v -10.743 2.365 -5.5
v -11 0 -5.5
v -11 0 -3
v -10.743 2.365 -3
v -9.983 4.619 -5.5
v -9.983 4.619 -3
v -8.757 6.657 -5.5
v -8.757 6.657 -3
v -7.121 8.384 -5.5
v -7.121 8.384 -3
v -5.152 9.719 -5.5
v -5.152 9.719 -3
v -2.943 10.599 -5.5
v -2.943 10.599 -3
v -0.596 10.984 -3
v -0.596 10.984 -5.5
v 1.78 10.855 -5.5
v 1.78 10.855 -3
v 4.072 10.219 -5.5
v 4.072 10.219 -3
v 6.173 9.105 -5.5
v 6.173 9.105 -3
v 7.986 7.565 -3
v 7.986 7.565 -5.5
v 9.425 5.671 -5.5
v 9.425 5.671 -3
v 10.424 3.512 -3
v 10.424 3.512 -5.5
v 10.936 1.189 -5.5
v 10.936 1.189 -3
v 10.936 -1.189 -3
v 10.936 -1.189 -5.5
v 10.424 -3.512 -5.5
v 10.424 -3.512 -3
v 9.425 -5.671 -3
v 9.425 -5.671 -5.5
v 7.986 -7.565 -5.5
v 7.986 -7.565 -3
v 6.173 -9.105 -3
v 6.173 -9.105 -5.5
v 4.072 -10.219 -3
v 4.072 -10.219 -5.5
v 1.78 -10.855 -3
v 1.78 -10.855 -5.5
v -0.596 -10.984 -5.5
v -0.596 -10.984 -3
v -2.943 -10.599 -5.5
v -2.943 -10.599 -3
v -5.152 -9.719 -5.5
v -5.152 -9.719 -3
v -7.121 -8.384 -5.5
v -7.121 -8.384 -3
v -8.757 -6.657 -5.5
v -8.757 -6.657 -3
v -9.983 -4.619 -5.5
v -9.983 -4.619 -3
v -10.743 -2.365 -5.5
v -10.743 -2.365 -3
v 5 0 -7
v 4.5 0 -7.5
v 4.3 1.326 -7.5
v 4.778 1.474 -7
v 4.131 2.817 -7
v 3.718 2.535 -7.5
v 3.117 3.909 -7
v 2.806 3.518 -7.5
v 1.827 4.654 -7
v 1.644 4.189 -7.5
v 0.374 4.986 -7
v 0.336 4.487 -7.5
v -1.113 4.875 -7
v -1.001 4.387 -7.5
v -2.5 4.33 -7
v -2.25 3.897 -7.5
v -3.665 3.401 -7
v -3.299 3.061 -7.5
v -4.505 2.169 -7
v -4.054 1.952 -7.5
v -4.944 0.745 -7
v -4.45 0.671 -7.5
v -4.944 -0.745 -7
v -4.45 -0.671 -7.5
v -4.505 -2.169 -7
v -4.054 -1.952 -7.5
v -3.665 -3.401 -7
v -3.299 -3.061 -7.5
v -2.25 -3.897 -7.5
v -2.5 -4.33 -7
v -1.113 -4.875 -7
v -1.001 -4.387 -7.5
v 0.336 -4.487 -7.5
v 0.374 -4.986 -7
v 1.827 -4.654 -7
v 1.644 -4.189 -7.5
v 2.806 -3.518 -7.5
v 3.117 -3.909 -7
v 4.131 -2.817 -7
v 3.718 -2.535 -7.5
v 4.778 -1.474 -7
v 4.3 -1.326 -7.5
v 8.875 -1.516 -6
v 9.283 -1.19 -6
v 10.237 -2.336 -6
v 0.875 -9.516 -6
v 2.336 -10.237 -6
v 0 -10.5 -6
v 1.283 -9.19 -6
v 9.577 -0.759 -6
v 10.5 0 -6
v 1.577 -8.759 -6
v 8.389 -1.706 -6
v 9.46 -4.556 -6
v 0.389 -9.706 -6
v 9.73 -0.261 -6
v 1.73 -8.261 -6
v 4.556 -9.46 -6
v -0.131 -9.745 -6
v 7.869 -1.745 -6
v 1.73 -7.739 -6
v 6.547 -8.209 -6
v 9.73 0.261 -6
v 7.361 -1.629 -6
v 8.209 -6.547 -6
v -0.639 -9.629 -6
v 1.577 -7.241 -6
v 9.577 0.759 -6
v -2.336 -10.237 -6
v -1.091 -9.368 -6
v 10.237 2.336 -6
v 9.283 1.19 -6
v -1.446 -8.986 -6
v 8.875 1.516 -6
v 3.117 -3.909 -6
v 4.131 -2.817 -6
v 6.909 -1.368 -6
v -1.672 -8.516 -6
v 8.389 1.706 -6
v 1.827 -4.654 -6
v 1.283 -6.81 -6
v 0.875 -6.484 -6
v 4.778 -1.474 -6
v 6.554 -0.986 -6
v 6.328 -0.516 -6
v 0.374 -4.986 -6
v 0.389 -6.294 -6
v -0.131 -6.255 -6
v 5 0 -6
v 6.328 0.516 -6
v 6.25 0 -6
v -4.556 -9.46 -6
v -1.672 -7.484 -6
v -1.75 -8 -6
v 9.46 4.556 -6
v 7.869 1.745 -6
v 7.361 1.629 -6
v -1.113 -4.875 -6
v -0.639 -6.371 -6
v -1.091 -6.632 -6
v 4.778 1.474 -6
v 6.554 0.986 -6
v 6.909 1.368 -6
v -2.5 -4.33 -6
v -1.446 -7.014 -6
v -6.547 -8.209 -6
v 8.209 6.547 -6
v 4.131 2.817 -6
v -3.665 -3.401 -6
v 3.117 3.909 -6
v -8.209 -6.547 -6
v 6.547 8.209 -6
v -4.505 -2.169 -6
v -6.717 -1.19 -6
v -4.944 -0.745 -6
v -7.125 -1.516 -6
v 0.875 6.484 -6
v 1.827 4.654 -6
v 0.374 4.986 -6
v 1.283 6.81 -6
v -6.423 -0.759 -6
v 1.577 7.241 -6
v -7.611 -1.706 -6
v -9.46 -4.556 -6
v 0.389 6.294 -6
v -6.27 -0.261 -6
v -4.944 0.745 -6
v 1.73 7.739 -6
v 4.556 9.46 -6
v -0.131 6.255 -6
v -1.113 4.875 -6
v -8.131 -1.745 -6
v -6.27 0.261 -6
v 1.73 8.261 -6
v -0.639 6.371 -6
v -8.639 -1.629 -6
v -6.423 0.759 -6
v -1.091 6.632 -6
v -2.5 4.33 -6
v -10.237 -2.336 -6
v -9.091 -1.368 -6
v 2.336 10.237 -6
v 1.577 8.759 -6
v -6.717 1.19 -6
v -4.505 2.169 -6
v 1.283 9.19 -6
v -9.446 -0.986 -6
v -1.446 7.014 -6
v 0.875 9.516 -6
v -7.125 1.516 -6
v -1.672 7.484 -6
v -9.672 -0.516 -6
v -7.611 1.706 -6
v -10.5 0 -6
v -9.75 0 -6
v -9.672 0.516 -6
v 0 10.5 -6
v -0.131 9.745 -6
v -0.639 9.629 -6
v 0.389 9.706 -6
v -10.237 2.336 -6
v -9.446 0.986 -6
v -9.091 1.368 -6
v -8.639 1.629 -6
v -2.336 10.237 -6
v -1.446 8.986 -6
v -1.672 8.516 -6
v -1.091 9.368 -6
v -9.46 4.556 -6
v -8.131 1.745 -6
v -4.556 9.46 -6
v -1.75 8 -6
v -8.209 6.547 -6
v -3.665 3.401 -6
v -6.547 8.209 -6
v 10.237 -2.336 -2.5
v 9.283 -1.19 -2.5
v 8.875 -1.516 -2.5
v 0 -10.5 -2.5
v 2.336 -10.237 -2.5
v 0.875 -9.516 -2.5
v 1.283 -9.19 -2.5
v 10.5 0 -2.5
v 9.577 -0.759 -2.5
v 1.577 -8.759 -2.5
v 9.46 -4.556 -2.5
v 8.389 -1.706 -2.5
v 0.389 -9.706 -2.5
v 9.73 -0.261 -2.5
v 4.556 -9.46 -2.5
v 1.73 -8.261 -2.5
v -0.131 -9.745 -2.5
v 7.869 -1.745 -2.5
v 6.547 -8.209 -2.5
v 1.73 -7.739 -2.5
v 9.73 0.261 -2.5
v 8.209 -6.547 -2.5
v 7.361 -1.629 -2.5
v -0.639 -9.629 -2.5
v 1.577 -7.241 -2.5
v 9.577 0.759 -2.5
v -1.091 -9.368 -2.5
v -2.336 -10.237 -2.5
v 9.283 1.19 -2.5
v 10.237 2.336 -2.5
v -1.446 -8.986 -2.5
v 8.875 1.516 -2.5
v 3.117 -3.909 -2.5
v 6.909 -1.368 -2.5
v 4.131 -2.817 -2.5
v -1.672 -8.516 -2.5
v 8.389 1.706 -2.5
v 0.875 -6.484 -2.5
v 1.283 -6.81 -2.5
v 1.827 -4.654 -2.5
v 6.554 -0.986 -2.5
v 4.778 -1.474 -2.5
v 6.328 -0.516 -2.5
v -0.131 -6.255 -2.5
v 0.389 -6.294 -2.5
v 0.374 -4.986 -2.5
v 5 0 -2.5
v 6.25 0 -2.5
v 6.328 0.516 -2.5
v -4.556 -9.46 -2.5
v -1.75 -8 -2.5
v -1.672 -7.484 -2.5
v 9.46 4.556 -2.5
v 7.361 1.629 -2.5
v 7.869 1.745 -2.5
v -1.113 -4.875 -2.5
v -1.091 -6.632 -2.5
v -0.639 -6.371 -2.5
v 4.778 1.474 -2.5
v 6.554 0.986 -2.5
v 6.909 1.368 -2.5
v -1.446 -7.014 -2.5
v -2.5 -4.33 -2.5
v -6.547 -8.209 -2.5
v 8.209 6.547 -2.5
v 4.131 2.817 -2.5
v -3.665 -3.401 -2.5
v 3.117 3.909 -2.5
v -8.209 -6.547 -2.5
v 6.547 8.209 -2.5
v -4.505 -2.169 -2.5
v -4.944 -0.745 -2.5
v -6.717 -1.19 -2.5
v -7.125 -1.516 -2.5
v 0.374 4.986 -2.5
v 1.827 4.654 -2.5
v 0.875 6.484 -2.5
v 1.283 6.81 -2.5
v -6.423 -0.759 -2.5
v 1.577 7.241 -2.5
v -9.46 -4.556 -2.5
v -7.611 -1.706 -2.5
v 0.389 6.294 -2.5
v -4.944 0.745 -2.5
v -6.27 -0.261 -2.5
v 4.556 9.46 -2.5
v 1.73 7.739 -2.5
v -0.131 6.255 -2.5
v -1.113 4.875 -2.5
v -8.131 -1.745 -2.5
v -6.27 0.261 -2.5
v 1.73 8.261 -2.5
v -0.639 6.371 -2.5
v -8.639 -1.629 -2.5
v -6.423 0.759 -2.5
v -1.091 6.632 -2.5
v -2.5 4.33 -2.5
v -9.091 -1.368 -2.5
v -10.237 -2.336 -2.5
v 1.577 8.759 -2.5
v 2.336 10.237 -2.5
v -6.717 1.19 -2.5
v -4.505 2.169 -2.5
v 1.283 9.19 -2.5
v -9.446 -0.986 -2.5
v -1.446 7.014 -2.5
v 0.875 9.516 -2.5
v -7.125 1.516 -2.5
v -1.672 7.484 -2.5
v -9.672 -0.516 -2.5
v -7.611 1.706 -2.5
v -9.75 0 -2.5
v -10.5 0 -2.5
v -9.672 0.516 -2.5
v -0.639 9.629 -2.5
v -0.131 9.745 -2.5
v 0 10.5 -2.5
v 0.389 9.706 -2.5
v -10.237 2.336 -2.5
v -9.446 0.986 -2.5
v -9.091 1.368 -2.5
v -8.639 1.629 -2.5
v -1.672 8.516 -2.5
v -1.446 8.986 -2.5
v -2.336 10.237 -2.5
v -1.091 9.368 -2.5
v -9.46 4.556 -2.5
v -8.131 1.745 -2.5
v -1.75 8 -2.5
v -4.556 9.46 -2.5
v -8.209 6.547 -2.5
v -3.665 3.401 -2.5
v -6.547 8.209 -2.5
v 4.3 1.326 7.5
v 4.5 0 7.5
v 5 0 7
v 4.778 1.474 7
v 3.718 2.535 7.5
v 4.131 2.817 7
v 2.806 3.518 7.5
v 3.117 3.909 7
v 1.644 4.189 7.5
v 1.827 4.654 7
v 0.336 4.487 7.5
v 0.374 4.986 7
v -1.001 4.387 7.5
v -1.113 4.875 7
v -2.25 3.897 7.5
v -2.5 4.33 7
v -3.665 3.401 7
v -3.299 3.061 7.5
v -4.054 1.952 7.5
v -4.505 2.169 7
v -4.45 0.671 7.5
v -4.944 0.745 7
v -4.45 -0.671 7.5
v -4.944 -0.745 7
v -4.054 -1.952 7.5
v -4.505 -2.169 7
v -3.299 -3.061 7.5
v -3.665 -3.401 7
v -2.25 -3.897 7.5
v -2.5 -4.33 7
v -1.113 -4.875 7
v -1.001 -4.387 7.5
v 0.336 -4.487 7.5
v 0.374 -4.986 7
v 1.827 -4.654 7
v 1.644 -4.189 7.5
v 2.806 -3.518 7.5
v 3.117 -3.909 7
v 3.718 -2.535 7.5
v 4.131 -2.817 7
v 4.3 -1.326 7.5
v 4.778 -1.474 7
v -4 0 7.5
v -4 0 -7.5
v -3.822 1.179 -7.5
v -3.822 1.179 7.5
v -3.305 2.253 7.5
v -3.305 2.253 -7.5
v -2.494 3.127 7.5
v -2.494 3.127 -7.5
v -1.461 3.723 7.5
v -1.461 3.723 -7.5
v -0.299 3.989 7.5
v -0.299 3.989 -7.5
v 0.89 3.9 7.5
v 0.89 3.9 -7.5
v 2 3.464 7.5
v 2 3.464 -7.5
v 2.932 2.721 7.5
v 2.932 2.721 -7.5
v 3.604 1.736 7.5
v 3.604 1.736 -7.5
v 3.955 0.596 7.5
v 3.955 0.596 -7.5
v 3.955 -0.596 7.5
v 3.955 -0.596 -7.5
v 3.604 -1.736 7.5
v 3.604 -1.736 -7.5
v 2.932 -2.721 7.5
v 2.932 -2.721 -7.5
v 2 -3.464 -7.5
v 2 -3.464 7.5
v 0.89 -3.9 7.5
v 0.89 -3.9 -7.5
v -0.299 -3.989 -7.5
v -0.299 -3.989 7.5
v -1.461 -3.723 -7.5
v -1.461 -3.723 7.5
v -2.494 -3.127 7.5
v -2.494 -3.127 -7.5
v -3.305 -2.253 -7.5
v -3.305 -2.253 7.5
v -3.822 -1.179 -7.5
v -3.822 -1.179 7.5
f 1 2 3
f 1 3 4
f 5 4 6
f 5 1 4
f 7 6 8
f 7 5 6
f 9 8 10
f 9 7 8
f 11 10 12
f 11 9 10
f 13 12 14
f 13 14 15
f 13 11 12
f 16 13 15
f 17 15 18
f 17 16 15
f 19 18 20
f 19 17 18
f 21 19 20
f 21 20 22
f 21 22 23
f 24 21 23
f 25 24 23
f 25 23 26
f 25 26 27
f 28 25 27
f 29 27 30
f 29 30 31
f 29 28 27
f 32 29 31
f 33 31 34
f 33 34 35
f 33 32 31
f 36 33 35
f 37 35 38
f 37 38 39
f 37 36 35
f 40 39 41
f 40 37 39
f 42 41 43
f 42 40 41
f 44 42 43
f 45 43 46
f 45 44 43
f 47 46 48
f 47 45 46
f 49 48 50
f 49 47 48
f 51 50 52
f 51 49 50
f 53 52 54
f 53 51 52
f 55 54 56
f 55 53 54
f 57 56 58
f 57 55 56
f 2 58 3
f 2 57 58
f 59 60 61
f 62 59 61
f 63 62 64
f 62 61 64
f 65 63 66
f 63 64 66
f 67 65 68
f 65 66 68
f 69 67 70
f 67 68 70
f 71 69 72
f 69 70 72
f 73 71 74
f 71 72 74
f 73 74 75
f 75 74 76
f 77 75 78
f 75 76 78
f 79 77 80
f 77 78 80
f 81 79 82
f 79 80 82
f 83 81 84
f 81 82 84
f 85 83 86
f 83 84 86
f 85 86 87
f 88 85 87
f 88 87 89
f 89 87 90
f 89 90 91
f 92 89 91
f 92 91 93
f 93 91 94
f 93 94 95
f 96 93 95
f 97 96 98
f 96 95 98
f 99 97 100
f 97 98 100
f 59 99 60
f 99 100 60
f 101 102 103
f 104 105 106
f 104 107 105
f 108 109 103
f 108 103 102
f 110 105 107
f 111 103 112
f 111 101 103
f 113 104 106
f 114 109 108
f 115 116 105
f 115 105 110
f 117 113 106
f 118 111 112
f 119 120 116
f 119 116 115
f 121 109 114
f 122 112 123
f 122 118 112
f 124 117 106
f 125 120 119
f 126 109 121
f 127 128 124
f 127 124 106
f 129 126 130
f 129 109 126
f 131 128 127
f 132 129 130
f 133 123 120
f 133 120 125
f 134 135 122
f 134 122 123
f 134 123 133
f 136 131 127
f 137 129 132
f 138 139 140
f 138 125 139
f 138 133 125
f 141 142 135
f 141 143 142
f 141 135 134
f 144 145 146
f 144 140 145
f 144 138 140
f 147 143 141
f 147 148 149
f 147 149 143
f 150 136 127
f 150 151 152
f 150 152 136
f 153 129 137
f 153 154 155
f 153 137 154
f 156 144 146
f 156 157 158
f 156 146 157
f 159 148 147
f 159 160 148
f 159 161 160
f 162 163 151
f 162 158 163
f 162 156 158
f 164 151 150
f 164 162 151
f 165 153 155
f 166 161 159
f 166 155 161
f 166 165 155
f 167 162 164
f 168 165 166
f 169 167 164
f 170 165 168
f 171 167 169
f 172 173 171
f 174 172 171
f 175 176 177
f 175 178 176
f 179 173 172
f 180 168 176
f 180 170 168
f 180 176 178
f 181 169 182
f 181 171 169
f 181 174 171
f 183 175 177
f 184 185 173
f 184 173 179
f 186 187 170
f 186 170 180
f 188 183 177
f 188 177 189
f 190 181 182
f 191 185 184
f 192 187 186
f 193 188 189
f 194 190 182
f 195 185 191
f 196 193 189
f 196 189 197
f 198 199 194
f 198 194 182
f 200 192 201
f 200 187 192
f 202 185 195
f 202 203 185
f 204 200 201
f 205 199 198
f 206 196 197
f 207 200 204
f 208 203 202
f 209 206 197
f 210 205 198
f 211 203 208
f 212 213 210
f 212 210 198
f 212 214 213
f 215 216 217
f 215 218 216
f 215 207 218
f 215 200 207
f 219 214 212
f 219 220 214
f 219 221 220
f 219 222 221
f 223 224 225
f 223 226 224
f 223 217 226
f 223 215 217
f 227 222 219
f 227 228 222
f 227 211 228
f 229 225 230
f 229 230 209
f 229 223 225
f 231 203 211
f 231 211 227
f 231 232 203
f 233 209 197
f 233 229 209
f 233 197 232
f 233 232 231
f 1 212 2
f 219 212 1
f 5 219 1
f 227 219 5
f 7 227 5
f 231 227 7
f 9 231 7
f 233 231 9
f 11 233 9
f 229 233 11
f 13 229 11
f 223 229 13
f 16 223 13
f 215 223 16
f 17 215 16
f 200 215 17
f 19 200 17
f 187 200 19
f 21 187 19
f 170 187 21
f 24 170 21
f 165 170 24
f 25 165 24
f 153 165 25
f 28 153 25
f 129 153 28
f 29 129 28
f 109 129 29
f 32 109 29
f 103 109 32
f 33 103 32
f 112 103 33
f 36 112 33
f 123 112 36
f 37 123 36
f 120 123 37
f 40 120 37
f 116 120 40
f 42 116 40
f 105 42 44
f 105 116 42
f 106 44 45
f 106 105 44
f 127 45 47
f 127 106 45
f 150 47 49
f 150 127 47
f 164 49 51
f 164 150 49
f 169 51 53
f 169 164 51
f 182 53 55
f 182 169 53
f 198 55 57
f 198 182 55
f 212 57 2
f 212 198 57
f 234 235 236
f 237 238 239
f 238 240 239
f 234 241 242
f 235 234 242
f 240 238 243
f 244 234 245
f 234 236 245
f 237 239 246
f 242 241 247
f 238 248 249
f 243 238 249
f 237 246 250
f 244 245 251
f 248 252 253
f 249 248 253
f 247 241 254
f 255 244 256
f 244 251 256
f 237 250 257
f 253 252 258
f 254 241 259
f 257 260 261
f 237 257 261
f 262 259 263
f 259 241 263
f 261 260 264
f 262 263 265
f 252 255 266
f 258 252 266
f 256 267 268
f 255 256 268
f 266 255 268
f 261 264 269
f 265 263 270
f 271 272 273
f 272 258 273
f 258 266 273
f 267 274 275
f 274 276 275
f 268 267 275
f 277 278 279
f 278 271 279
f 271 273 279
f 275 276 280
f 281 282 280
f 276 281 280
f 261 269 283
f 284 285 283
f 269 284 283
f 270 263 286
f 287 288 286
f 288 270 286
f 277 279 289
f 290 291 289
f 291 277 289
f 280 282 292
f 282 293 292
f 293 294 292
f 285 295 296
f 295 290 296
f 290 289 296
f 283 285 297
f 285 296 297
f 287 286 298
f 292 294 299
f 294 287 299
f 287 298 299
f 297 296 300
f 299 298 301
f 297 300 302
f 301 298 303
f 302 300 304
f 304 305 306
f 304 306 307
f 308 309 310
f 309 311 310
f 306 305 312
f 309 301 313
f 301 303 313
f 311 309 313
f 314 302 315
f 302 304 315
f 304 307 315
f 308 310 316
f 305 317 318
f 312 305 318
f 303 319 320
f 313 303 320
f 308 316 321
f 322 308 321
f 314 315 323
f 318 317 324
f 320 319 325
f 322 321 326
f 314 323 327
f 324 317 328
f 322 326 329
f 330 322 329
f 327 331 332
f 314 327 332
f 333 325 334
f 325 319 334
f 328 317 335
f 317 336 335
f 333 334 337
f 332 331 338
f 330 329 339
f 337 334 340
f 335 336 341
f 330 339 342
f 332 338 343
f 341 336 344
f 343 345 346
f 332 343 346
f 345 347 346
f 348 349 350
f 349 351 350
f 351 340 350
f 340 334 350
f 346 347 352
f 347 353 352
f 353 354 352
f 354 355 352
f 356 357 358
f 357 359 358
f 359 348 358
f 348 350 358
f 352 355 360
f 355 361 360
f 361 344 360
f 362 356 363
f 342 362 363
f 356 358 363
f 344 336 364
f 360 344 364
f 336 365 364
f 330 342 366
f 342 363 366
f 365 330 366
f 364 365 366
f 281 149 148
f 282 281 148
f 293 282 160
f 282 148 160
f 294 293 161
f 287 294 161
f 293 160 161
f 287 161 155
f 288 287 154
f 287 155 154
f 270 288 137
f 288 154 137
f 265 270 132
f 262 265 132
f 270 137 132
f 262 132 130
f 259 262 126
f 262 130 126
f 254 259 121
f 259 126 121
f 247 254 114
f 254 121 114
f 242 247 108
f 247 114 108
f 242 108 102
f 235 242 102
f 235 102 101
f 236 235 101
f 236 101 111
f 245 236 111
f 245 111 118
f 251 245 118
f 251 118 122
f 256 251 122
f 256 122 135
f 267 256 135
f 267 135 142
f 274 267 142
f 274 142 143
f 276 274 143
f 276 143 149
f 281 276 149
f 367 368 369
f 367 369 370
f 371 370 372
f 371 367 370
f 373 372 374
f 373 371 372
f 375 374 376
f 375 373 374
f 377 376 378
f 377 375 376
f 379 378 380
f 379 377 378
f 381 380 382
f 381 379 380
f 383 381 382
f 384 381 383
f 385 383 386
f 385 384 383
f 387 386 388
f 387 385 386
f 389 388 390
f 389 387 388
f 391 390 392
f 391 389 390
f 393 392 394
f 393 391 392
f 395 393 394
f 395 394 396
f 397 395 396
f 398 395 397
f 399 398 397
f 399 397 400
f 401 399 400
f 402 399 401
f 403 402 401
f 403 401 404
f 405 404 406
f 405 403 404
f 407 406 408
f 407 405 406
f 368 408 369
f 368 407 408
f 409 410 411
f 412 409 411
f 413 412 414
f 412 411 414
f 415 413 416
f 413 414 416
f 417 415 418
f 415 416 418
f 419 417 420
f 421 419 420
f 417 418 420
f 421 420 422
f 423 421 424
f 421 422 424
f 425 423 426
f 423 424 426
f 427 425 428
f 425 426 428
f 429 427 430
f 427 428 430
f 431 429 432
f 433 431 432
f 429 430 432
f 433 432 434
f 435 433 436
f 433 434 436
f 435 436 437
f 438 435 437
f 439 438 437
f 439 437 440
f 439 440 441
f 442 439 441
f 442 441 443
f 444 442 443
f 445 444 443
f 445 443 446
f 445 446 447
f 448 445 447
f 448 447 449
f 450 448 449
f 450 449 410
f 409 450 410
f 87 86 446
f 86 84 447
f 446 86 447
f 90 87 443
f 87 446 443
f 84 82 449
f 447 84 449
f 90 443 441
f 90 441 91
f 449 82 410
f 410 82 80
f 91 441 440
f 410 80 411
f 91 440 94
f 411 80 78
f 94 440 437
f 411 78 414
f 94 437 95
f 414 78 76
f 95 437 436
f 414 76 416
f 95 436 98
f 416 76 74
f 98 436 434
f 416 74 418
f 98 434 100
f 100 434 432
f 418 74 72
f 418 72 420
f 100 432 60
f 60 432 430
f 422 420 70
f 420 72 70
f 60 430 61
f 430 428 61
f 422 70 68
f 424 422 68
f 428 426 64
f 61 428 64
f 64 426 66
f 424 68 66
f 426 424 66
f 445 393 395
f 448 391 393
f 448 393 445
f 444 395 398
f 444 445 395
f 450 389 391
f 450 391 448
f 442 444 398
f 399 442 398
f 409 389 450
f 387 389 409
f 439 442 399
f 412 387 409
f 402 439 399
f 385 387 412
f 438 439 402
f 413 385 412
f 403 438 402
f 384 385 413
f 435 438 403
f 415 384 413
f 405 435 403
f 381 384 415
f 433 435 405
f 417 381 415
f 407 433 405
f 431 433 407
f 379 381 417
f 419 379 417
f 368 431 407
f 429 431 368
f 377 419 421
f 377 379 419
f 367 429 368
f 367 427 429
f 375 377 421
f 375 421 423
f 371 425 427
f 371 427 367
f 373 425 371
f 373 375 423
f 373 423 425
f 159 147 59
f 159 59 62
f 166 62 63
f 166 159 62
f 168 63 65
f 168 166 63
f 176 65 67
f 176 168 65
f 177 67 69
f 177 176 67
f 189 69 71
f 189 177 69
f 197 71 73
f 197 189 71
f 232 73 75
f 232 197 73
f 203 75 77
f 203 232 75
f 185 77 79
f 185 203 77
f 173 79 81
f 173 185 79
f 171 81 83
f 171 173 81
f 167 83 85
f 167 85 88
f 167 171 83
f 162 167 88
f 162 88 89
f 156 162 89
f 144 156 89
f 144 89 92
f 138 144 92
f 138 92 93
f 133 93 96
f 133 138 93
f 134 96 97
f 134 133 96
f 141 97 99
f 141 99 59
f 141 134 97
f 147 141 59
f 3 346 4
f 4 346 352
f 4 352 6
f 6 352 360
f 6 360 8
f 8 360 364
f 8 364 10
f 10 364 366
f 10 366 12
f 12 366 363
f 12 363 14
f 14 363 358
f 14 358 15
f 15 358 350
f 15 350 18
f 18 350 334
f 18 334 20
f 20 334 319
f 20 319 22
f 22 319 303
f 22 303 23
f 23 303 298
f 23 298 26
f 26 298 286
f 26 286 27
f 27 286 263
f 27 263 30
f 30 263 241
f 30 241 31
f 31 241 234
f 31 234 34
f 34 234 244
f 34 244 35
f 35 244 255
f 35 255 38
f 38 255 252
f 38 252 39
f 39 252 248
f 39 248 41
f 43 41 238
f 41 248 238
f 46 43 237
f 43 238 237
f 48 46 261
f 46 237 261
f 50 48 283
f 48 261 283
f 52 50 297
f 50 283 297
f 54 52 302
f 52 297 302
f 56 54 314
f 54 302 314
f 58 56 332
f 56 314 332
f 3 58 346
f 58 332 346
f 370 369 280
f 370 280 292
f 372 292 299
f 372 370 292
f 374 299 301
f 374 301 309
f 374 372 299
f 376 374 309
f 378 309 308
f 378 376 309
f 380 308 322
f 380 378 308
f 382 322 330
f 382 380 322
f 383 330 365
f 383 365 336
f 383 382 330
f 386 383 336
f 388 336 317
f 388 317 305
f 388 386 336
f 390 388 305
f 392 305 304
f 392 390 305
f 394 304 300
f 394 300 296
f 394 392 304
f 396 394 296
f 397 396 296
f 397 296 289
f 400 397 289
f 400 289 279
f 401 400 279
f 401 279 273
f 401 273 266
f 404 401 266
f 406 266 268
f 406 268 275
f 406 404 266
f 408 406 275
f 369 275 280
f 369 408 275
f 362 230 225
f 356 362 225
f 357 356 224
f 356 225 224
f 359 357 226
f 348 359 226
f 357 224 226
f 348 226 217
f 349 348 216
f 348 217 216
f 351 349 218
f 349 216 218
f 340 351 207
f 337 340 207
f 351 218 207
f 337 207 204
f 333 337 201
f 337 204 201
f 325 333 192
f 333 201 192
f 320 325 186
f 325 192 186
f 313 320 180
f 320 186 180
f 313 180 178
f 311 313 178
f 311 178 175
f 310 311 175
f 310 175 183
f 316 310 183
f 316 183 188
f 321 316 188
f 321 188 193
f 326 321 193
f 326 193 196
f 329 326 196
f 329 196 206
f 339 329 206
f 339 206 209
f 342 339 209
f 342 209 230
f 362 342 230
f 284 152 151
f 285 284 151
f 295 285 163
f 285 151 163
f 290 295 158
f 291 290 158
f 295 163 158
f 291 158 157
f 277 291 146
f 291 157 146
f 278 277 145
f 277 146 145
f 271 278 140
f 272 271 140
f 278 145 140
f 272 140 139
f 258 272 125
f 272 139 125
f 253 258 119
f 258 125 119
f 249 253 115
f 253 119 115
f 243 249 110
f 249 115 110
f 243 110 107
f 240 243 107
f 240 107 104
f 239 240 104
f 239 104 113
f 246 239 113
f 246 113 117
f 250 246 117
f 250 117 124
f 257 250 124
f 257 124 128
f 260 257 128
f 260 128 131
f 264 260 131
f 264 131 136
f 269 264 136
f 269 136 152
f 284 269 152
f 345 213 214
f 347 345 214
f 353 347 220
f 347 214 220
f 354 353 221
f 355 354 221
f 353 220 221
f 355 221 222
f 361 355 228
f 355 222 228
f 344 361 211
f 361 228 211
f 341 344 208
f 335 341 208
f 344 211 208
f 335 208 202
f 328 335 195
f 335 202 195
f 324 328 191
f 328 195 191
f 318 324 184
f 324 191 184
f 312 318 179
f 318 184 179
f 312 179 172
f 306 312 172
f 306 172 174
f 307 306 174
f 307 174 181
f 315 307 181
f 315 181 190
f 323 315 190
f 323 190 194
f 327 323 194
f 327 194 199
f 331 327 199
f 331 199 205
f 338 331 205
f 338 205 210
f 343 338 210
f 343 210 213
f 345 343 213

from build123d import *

# Parameters (mm, degrees)
SKETCH_1_R          = 5
EXTRUDE_1_DEPTH     = 7.5
EXTRUDE_START       = -1.5
SKETCH_2_R          = 11
EXTRUDE_2_DEPTH     = 3.5
SKETCH_3_R          = 4
CUT_EXTRUDE_1_DEPTH = 16
SKETCH_4_R          = 1.75
CUT_EXTRUDE_2_DEPTH = 14.5
CHAMFER_1_SIZE      = 0.5


with BuildPart() as part:
    # 草图1 → 凸台-拉伸1 (new body, symmetric)
    with BuildSketch(Plane.XY):
        Circle(SKETCH_1_R)
    extrude(amount=EXTRUDE_1_DEPTH, both=True)

    # 草图2 → 凸台-拉伸2 (add)
    with BuildSketch(Plane(origin=(0, 0, -7.5), x_dir=(-1, 0, 0), z_dir=(0, 0, -1)).offset(EXTRUDE_START)):
        Circle(SKETCH_2_R)
    extrude(amount=-EXTRUDE_2_DEPTH)

    # 草图3 → 切除-拉伸1 (cut, through all)
    with BuildSketch(Plane(origin=(0, 0, -7.5), x_dir=(-1, 0, 0), z_dir=(0, 0, -1))):
        Circle(SKETCH_3_R)
    extrude(amount=-CUT_EXTRUDE_1_DEPTH, mode=Mode.SUBTRACT)

    # 草图4 → 切除-拉伸2 (cut, through all)
    with BuildSketch(Plane(origin=(0, 0, -6), x_dir=(-1, 0, 0), z_dir=(0, 0, -1))):
        with Locations((0, 8)):
            Circle(SKETCH_4_R)
        with Locations((8, 0)):
            Circle(SKETCH_4_R)
        with Locations((0, -8)):
            Circle(SKETCH_4_R)
        with Locations((-8, 0)):
            Circle(SKETCH_4_R)
    extrude(amount=-CUT_EXTRUDE_2_DEPTH, mode=Mode.SUBTRACT)

    # 倒角1
    chamfer_1_edges = [part.edges().sort_by_distance(p)[0] for p in [
        (-5, 0, -7.5),
        (-5, 0, 7.5),
        (11, 0, -2.5),
        (11, 0, -6),
    ]]
    chamfer(chamfer_1_edges, length=CHAMFER_1_SIZE)


solid = part.part
